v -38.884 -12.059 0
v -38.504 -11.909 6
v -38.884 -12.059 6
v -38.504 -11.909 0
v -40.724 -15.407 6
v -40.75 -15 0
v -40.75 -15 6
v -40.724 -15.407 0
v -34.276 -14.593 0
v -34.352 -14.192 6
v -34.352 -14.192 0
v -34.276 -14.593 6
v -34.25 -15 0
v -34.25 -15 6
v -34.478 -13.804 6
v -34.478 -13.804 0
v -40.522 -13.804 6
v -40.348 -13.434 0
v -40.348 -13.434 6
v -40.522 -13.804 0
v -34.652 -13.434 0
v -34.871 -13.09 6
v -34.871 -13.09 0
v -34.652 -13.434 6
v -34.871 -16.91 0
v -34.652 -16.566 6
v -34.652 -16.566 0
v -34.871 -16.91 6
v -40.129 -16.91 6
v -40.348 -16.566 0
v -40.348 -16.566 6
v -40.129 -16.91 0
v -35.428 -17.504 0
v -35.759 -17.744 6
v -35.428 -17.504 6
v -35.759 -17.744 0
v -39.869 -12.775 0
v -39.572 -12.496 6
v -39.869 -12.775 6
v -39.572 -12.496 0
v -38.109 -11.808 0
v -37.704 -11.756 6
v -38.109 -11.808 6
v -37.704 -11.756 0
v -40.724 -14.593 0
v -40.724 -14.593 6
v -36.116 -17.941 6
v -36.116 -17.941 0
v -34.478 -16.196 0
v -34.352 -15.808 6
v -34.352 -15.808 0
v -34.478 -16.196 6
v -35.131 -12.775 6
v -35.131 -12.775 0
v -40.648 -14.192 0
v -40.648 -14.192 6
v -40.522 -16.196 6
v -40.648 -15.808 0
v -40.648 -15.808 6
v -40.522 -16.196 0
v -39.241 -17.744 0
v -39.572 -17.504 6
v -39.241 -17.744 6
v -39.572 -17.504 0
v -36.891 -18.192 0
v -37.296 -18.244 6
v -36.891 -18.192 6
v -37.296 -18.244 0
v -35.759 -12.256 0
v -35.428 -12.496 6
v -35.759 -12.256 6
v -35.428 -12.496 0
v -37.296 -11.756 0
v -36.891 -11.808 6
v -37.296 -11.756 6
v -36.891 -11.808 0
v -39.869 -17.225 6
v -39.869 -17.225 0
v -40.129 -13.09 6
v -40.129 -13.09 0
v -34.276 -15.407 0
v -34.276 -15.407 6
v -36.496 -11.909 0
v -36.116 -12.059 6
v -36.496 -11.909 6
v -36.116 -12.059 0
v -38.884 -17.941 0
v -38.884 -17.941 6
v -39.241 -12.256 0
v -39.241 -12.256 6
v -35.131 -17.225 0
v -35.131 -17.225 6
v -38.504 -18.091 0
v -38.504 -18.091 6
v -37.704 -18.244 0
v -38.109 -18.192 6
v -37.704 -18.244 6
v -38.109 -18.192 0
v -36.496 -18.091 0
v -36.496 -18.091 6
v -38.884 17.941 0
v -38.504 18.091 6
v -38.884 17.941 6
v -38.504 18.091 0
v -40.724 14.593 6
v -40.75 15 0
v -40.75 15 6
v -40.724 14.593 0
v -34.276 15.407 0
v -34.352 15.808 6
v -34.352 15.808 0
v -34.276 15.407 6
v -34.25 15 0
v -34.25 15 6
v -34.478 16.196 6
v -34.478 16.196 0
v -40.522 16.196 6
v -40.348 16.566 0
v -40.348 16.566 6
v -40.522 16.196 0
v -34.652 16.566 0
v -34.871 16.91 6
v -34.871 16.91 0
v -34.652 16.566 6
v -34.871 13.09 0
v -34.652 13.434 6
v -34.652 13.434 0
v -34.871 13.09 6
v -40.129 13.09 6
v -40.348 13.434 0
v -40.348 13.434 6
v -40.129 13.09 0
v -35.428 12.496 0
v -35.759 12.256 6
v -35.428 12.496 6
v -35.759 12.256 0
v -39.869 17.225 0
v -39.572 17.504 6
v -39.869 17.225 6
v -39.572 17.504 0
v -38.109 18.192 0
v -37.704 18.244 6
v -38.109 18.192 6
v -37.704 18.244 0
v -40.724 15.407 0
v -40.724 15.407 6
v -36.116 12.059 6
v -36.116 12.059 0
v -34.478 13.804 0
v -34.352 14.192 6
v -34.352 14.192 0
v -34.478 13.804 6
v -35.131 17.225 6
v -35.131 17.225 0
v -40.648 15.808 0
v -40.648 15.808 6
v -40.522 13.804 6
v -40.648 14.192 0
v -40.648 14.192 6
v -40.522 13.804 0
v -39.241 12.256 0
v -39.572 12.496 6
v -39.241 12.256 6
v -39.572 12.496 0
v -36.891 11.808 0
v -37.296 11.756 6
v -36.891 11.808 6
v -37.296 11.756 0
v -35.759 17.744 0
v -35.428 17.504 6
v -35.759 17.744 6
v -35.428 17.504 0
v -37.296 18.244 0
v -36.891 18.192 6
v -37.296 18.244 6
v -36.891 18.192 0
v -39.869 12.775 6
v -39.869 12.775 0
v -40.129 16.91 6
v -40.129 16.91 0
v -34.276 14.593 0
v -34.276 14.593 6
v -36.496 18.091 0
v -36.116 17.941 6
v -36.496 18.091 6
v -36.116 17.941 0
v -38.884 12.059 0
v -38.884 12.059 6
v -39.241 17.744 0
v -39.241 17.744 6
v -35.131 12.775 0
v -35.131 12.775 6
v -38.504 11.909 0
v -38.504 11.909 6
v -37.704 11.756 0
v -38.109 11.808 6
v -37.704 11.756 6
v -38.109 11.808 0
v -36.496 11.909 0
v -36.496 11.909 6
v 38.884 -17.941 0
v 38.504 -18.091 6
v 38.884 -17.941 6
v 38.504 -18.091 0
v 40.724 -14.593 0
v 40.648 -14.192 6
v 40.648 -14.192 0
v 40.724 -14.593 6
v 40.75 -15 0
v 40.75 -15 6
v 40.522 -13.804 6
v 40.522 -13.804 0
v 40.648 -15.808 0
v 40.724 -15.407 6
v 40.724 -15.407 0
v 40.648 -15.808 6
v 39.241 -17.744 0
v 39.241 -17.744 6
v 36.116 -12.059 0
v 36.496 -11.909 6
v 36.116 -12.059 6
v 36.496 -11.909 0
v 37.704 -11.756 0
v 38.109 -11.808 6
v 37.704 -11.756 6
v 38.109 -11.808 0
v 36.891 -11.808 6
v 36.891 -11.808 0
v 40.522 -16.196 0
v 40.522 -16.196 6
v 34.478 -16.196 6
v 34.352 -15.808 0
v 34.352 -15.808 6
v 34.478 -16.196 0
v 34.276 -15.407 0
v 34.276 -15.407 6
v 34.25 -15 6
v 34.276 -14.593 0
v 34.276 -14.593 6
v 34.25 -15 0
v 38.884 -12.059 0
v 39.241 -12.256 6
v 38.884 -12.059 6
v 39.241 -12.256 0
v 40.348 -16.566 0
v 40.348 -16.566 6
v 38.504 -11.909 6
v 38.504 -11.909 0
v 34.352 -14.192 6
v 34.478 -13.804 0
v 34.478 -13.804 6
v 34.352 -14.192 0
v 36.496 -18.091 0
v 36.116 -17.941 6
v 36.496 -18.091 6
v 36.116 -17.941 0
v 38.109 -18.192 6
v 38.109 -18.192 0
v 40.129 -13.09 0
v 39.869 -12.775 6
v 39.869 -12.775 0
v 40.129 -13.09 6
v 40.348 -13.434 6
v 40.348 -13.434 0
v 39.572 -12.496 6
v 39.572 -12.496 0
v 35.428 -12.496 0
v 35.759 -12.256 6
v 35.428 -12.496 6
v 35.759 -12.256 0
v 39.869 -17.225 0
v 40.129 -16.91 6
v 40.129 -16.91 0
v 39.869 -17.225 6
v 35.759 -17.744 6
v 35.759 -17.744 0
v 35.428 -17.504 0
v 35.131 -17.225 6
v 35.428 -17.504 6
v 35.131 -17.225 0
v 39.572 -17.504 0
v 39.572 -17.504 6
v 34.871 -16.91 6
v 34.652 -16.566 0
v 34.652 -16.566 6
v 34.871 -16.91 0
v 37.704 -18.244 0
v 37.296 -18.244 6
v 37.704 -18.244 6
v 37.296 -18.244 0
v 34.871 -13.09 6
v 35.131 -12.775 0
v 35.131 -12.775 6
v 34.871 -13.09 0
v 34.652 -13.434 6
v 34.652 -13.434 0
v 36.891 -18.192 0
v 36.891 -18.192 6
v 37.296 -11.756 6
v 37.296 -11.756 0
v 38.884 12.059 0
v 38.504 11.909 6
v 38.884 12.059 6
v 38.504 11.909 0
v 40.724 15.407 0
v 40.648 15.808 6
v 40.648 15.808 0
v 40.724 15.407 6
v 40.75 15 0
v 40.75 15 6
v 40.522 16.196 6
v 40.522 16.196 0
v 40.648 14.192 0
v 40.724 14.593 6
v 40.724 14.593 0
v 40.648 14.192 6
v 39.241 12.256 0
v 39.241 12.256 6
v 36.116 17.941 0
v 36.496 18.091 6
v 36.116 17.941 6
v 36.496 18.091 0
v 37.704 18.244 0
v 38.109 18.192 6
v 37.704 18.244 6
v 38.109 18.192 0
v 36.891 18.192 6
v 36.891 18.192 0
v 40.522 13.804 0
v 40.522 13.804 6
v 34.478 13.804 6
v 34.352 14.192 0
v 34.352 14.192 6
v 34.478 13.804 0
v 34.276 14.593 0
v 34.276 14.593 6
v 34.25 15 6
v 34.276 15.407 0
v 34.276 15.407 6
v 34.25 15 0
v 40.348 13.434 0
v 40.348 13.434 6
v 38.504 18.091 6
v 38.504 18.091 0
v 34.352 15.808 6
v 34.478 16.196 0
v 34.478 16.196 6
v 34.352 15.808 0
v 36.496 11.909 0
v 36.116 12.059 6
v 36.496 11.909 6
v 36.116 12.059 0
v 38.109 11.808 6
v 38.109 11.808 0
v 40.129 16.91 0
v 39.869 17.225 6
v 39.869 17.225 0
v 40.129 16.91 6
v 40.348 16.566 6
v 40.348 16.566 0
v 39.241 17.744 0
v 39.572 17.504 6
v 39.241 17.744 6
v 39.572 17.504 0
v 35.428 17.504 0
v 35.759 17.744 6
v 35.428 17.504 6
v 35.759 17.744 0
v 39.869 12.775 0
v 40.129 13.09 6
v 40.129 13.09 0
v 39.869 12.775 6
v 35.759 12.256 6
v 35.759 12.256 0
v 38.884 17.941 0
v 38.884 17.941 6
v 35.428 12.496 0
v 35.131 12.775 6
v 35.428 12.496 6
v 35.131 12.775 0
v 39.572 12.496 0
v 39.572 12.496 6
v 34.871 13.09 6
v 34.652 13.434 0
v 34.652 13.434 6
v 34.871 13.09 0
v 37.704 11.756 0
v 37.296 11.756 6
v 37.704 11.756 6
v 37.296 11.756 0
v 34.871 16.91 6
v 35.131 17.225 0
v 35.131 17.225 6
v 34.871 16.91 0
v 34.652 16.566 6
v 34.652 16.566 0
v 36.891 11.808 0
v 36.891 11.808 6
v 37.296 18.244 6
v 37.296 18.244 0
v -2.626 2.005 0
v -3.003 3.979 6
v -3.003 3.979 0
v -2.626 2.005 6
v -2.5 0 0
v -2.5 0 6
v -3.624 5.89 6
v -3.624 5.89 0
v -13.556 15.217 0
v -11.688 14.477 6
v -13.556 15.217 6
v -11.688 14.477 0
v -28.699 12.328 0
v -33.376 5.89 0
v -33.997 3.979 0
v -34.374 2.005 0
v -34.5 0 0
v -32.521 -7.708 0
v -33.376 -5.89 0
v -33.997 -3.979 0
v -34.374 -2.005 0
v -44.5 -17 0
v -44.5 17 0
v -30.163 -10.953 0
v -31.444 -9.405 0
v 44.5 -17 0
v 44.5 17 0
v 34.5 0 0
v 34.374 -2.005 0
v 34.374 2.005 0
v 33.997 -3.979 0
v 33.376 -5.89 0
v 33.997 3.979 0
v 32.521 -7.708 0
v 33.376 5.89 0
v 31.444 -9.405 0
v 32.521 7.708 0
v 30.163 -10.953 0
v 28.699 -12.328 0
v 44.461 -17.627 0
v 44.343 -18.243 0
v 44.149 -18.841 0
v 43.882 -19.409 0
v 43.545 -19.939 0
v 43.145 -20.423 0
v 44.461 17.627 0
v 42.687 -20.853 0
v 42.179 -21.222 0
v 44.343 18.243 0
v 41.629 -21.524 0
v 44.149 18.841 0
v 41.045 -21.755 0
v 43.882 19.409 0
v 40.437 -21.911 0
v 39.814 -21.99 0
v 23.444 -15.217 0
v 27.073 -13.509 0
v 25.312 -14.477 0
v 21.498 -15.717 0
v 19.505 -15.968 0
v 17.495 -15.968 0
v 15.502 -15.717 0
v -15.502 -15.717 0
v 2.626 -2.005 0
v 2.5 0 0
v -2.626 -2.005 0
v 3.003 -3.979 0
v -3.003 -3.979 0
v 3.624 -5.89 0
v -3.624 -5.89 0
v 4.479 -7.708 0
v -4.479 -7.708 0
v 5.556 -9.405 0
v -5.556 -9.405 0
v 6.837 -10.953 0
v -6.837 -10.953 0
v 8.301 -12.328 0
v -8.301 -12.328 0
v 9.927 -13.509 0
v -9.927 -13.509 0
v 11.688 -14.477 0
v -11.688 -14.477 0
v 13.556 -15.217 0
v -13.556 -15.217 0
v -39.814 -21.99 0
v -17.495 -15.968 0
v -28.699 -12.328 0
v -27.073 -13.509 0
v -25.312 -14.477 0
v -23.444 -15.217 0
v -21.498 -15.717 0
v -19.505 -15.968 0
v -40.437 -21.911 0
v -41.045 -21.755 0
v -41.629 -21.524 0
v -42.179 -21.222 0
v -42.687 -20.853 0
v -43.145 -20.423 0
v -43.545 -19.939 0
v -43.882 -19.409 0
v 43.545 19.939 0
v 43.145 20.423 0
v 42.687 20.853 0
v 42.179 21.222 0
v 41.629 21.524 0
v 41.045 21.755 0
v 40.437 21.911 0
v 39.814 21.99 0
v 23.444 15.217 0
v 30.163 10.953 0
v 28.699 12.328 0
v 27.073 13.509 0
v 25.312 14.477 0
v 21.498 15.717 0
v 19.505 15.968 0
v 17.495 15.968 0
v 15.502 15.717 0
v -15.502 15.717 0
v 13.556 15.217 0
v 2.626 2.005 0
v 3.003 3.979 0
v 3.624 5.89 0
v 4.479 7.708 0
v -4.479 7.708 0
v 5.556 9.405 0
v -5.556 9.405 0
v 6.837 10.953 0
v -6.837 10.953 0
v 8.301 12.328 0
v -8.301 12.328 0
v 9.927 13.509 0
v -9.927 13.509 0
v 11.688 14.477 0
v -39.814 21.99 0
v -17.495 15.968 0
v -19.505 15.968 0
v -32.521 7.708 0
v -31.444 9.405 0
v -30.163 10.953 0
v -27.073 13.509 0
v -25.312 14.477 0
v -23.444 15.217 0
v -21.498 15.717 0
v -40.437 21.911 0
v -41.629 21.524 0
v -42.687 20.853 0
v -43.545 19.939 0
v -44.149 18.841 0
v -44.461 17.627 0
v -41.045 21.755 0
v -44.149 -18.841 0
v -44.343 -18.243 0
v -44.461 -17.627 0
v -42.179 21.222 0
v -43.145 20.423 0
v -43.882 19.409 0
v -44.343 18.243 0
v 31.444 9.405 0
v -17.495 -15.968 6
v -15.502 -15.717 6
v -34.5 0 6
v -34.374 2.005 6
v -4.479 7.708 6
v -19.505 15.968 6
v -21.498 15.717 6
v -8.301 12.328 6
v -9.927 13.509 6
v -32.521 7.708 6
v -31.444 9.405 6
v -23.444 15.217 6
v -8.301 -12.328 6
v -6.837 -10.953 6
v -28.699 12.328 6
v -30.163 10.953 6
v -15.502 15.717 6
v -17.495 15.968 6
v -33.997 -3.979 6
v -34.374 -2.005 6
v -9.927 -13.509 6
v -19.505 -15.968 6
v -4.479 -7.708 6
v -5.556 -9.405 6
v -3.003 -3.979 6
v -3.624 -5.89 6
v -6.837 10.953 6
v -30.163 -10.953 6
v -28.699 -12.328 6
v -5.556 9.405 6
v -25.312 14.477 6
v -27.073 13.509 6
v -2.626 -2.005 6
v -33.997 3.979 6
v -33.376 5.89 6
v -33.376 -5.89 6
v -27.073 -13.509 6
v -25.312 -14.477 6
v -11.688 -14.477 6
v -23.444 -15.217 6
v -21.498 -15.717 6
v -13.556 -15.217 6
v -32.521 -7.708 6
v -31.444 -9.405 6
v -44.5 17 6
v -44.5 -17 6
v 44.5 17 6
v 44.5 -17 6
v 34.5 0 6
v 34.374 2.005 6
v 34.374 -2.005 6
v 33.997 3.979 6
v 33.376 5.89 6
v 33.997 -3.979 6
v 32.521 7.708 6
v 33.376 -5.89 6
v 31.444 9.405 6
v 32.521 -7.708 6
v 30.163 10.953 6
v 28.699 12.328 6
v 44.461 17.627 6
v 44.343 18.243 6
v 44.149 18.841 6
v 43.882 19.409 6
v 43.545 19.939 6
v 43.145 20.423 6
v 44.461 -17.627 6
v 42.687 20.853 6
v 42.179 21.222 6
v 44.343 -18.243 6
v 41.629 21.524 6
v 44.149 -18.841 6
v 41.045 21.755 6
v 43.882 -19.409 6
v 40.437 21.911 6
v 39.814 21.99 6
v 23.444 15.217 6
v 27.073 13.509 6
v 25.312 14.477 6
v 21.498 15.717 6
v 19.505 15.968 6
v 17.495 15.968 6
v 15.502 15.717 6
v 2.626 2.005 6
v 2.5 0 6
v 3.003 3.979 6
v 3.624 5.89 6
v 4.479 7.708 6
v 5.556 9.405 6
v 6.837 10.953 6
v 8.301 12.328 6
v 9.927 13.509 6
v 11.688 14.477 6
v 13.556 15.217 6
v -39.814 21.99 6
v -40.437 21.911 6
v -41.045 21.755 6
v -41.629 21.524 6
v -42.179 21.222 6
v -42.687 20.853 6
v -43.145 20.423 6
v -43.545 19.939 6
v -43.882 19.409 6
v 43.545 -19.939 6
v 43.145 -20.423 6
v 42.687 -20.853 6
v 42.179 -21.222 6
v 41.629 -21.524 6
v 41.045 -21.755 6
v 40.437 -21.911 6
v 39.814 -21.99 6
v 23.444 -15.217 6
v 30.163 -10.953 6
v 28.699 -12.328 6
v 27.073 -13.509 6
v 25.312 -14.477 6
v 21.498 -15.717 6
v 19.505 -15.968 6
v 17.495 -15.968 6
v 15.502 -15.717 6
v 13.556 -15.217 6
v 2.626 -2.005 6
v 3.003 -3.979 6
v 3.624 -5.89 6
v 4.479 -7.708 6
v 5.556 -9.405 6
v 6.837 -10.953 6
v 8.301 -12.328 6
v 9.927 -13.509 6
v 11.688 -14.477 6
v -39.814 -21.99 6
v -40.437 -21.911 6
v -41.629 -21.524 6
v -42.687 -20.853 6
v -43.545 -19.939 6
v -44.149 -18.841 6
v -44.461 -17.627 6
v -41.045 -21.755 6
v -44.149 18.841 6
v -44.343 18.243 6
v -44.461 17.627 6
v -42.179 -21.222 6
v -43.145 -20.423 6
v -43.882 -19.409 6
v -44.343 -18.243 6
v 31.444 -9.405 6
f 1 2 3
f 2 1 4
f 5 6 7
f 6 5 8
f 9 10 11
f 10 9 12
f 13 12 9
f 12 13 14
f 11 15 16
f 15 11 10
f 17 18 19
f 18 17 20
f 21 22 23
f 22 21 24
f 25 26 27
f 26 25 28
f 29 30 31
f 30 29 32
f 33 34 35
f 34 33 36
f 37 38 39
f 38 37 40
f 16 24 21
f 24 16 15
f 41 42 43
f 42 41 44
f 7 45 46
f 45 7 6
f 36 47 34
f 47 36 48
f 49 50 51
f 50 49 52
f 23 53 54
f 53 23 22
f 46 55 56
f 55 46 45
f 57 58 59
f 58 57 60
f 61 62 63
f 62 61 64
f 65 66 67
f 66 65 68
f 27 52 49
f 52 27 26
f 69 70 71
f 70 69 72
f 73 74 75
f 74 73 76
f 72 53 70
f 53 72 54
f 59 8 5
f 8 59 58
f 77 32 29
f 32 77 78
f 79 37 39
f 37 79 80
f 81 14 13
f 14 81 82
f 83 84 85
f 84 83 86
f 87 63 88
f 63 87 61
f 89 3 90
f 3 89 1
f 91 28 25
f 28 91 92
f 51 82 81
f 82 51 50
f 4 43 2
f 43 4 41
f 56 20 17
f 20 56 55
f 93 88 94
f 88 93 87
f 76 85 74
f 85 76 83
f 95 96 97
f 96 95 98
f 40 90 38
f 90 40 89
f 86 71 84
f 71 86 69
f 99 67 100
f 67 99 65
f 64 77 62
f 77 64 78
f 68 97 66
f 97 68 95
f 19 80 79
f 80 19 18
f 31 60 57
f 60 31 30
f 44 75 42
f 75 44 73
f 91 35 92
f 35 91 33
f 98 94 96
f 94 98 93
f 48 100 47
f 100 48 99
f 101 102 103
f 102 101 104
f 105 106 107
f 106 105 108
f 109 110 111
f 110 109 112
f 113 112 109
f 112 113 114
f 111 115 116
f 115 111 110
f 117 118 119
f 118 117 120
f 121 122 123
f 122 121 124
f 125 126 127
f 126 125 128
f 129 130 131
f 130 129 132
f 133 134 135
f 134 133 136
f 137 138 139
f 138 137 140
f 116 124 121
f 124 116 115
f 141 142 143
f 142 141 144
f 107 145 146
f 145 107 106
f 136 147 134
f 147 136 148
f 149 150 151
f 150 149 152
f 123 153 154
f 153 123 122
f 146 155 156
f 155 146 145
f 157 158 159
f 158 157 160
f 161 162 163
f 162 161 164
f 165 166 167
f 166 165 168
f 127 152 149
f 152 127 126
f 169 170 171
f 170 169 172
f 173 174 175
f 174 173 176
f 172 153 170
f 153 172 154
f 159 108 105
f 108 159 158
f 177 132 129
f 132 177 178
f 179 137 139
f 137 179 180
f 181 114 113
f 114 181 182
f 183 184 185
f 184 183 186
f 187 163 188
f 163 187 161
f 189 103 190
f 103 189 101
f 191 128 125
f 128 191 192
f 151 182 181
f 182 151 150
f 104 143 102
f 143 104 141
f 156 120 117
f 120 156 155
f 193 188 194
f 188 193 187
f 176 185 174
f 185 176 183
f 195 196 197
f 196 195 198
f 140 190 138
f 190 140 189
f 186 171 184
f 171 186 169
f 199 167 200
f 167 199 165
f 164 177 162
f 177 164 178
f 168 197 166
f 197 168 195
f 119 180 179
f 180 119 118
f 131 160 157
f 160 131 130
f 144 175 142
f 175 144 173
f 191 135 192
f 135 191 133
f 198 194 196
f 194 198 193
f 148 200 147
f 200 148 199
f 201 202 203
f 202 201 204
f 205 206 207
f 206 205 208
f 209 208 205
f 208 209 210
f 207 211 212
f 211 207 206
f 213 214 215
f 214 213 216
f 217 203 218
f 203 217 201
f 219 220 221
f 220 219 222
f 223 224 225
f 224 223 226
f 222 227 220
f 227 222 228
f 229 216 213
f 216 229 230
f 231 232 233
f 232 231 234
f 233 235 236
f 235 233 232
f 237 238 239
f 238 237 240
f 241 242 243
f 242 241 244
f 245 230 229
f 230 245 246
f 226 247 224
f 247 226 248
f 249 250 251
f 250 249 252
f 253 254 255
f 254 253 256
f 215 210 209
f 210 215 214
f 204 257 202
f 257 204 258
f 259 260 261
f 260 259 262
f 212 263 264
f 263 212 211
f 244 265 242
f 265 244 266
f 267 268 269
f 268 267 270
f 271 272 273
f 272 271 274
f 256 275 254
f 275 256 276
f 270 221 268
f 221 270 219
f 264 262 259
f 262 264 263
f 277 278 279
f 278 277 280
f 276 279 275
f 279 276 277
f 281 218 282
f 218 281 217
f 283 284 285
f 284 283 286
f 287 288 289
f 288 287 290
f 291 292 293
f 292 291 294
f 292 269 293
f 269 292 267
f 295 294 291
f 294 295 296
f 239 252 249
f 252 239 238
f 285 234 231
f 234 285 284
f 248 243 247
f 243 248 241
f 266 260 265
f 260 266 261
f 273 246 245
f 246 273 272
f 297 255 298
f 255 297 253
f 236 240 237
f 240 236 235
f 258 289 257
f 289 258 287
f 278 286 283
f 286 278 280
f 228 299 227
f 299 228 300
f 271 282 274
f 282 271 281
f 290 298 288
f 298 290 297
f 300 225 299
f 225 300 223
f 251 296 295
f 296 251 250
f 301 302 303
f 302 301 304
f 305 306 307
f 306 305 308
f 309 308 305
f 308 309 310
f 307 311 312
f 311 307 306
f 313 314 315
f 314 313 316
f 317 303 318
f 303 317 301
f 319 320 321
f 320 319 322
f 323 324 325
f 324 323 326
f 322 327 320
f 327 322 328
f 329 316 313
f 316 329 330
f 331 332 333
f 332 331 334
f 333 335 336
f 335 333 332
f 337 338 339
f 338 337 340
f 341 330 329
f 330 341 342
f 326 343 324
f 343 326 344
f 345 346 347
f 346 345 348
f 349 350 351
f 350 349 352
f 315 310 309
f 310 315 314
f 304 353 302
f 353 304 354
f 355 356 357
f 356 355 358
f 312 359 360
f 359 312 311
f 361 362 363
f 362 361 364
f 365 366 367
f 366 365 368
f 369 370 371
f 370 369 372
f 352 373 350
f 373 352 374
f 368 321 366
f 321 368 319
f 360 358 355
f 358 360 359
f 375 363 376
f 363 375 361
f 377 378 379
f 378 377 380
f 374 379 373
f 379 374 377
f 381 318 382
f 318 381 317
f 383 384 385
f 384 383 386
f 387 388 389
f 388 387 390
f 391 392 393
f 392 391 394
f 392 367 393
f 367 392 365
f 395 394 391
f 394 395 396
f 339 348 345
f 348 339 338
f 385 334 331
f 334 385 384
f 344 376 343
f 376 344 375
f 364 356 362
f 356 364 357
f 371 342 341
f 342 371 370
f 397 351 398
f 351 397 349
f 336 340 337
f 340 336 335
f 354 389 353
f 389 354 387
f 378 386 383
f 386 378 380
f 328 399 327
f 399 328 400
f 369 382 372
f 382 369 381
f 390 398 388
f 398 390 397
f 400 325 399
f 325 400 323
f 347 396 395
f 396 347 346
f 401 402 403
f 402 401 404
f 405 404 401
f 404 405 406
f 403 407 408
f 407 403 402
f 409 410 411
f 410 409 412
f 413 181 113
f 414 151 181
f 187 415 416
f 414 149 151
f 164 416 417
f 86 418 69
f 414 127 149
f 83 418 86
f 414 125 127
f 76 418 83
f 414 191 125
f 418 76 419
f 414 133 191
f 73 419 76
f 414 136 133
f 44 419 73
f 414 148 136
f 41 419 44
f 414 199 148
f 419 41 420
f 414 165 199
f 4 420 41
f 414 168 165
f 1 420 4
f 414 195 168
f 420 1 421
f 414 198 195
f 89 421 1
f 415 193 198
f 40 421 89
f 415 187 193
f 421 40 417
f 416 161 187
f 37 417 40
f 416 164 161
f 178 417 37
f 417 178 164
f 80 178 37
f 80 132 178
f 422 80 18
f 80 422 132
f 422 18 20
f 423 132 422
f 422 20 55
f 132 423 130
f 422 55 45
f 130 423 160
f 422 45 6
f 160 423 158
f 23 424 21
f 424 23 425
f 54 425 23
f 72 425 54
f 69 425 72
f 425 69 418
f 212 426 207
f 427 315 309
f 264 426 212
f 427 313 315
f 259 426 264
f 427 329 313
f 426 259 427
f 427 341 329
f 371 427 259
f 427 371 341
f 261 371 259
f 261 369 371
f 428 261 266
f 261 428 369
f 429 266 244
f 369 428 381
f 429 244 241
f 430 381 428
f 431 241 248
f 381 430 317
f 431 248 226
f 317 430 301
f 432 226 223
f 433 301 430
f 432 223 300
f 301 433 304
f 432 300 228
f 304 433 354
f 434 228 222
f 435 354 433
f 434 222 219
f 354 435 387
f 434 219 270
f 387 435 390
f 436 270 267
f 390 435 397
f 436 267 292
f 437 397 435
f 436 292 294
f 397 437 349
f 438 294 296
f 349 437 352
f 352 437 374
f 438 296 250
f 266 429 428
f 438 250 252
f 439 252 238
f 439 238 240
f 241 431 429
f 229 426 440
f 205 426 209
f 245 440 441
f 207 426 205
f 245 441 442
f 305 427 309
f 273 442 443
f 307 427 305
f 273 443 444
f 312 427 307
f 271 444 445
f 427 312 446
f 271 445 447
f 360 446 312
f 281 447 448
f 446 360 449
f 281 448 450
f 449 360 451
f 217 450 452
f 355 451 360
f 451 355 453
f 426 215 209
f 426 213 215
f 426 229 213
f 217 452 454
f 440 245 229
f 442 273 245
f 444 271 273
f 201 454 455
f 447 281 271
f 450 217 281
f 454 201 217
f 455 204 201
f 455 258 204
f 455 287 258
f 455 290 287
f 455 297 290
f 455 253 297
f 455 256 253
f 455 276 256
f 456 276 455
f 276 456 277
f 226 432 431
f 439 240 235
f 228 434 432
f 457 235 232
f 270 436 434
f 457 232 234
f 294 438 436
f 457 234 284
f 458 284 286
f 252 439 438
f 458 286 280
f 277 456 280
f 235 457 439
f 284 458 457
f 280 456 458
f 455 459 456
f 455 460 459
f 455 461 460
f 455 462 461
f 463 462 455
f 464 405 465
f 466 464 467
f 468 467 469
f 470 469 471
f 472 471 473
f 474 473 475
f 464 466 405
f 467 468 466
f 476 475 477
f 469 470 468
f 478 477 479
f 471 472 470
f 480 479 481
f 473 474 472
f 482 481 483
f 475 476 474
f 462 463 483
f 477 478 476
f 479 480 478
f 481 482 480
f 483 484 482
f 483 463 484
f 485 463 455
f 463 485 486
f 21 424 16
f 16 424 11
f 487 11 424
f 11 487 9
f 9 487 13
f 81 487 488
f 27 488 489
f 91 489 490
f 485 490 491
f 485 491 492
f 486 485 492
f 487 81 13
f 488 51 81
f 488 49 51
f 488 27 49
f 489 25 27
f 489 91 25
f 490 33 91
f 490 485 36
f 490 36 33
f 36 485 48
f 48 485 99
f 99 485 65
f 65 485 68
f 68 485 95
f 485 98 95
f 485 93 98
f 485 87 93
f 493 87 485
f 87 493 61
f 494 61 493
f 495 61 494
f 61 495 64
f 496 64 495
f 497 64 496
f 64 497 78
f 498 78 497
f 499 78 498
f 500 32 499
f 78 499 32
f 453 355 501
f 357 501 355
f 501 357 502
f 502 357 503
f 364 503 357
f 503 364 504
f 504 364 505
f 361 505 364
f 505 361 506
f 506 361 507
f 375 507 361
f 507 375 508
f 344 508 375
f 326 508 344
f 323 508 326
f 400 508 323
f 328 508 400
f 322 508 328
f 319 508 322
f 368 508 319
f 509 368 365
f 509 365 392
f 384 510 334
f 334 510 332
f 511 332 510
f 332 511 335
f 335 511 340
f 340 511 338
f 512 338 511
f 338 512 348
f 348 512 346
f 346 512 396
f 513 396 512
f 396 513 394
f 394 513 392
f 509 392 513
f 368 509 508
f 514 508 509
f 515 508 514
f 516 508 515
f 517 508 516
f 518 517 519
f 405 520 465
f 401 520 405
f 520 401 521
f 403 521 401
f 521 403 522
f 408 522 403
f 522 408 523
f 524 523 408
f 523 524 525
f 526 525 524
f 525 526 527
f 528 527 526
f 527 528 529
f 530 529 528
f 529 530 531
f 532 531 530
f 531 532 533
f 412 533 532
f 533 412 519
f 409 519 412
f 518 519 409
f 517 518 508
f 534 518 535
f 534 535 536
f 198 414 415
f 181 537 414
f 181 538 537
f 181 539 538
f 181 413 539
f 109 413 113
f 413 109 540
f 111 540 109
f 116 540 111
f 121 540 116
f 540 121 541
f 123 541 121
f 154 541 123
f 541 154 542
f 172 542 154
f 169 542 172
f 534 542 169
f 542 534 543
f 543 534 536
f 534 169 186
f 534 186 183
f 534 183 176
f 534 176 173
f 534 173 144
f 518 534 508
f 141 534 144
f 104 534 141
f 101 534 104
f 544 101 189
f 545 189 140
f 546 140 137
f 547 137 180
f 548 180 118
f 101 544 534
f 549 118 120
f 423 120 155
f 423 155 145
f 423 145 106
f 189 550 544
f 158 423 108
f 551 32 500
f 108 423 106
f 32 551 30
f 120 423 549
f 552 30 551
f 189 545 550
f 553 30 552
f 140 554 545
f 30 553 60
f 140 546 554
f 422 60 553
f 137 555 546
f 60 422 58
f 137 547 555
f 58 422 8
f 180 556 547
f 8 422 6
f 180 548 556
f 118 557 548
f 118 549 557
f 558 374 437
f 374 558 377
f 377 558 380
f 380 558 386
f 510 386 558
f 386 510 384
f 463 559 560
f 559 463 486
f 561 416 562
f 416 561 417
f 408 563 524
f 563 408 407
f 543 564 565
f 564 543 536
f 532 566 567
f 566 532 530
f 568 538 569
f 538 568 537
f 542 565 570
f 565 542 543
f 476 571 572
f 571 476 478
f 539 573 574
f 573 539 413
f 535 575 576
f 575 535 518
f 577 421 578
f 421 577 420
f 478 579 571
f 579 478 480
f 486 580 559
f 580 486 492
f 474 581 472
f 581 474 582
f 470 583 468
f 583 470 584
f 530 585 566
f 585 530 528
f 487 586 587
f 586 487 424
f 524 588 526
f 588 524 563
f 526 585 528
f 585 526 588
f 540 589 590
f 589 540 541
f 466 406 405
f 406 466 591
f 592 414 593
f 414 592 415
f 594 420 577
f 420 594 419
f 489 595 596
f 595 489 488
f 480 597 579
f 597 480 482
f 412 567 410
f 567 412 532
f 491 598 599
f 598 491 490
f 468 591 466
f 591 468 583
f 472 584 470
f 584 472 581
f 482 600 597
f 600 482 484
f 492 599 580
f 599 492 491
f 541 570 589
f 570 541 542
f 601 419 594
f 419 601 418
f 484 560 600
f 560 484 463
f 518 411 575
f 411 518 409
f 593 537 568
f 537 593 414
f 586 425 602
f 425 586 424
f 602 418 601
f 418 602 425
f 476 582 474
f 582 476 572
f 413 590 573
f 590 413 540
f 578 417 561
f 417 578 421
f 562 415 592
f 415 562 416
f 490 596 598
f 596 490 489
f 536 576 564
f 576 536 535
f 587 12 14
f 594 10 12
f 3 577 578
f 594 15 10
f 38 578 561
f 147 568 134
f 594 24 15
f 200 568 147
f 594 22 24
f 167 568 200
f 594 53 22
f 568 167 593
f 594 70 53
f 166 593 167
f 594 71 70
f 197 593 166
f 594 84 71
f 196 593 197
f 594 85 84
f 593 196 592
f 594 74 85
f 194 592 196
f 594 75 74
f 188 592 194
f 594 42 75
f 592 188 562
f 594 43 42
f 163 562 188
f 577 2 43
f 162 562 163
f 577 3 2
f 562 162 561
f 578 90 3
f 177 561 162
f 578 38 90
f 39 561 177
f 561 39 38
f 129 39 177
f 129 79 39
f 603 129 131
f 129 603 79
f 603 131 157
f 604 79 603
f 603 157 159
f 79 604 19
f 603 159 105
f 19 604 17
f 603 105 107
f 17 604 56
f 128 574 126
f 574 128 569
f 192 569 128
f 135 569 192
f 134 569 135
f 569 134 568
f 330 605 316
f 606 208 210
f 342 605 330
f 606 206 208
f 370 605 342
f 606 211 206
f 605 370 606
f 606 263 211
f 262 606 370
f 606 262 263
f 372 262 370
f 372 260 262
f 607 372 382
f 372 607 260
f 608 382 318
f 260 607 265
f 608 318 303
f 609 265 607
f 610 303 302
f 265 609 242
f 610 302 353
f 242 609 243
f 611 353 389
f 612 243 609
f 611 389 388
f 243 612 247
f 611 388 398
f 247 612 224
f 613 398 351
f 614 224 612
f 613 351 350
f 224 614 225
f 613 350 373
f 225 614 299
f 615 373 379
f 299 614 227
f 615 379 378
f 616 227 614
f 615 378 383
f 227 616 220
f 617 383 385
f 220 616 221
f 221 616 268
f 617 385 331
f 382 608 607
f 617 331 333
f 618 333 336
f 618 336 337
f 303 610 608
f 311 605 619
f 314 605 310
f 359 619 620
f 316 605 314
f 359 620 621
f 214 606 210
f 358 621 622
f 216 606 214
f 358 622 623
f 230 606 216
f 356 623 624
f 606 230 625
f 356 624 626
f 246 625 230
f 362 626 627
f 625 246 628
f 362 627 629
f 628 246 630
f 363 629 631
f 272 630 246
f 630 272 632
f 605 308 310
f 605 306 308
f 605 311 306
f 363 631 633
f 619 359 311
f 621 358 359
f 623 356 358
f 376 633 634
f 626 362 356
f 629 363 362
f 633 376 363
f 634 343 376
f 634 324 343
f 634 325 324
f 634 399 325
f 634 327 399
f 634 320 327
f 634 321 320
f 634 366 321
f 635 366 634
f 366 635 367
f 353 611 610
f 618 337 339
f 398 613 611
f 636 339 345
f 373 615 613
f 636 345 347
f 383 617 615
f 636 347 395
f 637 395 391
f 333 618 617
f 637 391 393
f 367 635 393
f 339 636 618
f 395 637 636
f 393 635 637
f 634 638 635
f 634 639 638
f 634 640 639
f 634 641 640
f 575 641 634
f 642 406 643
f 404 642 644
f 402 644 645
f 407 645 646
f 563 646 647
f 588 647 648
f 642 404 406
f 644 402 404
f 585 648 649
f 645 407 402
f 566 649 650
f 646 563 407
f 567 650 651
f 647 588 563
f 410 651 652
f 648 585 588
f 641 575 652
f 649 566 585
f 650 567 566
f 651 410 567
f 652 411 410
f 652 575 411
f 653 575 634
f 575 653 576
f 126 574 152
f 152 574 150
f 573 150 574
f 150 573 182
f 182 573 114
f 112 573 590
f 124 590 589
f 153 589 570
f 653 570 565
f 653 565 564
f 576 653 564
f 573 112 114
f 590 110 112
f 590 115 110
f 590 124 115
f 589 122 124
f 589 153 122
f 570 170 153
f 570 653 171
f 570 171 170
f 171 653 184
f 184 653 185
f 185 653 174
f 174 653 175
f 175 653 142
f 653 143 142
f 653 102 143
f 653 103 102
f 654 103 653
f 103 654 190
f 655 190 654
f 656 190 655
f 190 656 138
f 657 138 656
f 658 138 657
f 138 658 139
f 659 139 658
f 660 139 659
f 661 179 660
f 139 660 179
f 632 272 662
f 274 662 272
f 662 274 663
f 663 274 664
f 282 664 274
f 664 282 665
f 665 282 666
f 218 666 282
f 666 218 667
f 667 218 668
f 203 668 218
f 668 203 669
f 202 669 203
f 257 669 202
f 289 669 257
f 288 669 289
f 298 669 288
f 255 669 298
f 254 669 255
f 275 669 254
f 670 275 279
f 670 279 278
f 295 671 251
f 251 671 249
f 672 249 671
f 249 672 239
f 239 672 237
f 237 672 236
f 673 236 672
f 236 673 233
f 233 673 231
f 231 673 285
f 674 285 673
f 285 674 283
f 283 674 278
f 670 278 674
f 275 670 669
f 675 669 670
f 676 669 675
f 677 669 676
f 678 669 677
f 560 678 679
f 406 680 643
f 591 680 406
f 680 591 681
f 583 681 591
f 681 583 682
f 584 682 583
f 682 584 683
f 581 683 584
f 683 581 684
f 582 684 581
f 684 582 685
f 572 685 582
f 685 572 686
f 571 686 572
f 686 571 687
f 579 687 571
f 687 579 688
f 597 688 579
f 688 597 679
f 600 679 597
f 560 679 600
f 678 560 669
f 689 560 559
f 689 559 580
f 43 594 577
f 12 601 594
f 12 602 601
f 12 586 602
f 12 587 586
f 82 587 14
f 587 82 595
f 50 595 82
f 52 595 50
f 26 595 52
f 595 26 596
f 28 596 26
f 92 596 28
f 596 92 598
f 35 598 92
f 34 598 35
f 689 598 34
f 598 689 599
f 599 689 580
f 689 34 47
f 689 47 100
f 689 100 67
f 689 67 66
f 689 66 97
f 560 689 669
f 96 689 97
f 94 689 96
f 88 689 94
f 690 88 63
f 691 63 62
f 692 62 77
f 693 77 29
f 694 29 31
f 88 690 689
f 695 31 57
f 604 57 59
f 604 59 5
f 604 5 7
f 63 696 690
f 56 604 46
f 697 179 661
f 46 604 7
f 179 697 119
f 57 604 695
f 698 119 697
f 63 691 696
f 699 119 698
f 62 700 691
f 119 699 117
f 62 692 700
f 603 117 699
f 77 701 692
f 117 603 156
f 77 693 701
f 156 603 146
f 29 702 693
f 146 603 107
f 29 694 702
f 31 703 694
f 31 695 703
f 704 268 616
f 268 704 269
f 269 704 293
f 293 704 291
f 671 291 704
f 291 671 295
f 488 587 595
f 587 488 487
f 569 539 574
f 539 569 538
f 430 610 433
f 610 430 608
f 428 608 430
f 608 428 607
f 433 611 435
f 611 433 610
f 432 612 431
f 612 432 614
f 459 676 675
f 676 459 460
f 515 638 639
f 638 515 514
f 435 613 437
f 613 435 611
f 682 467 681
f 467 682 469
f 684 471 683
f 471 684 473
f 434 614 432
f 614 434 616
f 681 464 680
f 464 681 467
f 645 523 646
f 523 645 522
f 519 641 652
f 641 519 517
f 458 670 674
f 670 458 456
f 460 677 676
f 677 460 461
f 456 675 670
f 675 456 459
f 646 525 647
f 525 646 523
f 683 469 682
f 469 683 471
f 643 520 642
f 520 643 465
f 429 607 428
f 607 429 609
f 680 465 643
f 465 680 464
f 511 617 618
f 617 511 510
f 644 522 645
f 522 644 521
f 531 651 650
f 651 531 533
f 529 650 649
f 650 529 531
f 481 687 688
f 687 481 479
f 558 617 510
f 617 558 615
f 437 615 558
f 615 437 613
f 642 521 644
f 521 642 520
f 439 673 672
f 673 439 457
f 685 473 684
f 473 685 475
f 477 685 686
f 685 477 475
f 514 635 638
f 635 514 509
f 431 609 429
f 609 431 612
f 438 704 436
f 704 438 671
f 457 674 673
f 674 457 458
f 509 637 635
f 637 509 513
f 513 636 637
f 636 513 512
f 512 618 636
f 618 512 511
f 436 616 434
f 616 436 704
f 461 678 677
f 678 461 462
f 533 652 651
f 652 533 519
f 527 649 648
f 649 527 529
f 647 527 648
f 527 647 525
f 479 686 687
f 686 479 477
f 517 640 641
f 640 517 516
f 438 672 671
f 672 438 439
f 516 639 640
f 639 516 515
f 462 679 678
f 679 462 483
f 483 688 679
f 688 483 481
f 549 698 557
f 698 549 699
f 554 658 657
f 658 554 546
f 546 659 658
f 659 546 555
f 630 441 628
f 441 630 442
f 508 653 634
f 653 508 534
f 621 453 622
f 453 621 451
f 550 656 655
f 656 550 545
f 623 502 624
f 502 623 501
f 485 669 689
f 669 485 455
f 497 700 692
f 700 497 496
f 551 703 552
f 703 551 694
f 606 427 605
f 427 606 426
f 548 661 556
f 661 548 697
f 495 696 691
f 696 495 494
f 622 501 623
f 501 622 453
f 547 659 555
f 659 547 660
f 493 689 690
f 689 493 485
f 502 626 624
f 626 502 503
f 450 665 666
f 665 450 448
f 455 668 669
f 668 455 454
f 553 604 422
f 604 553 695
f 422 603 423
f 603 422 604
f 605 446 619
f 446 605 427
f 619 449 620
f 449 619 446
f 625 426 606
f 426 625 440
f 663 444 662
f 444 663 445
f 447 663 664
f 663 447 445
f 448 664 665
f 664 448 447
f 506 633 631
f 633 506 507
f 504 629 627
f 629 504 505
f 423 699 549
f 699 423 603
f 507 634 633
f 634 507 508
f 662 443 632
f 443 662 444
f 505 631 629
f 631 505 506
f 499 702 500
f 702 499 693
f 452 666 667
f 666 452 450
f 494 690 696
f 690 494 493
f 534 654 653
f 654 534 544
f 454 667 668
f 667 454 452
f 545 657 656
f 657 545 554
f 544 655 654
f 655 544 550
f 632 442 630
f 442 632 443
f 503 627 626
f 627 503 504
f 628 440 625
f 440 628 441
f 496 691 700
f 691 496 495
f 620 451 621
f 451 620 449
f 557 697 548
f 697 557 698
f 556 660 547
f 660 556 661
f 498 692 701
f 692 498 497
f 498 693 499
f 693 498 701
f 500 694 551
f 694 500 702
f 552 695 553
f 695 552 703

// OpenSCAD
$fn = 50;

difference() {
	union() {
		hull() {
			translate(v = [-39.5, 17.0, 0]) {
				cylinder(h = 6, r = 5);
			}
			translate(v = [39.5, 17.0, 0]) {
				cylinder(h = 6, r = 5);
			}
			translate(v = [-39.5, -17.0, 0]) {
				cylinder(h = 6, r = 5);
			}
			translate(v = [39.5, -17.0, 0]) {
				cylinder(h = 6, r = 5);
			}
		}
	}
	union() {
		translate(v = [-37.5, -15.0, -100.0]) {
			cylinder(h = 200, r = 3.25);
		}
		translate(v = [-37.5, 15.0, -100.0]) {
			cylinder(h = 200, r = 3.25);
		}
		translate(v = [37.5, -15.0, -100.0]) {
			cylinder(h = 200, r = 3.25);
		}
		translate(v = [37.5, 15.0, -100.0]) {
			cylinder(h = 200, r = 3.25);
		}
		translate(v = [-37.5, -15.0, -100.0]) {
			cylinder(h = 200, r = 1.8);
		}
		translate(v = [-37.5, 15.0, -100.0]) {
			cylinder(h = 200, r = 1.8);
		}
		translate(v = [37.5, -15.0, -100.0]) {
			cylinder(h = 200, r = 1.8);
		}
		translate(v = [37.5, 15.0, -100.0]) {
			cylinder(h = 200, r = 1.8);
		}
		translate(v = [-18.5, 0, 0.0]) {
			cylinder(h = 6, r = 16.0);
		}
		translate(v = [18.5, 0, 0.0]) {
			cylinder(h = 6, r = 16.0);
		}
	}
}
